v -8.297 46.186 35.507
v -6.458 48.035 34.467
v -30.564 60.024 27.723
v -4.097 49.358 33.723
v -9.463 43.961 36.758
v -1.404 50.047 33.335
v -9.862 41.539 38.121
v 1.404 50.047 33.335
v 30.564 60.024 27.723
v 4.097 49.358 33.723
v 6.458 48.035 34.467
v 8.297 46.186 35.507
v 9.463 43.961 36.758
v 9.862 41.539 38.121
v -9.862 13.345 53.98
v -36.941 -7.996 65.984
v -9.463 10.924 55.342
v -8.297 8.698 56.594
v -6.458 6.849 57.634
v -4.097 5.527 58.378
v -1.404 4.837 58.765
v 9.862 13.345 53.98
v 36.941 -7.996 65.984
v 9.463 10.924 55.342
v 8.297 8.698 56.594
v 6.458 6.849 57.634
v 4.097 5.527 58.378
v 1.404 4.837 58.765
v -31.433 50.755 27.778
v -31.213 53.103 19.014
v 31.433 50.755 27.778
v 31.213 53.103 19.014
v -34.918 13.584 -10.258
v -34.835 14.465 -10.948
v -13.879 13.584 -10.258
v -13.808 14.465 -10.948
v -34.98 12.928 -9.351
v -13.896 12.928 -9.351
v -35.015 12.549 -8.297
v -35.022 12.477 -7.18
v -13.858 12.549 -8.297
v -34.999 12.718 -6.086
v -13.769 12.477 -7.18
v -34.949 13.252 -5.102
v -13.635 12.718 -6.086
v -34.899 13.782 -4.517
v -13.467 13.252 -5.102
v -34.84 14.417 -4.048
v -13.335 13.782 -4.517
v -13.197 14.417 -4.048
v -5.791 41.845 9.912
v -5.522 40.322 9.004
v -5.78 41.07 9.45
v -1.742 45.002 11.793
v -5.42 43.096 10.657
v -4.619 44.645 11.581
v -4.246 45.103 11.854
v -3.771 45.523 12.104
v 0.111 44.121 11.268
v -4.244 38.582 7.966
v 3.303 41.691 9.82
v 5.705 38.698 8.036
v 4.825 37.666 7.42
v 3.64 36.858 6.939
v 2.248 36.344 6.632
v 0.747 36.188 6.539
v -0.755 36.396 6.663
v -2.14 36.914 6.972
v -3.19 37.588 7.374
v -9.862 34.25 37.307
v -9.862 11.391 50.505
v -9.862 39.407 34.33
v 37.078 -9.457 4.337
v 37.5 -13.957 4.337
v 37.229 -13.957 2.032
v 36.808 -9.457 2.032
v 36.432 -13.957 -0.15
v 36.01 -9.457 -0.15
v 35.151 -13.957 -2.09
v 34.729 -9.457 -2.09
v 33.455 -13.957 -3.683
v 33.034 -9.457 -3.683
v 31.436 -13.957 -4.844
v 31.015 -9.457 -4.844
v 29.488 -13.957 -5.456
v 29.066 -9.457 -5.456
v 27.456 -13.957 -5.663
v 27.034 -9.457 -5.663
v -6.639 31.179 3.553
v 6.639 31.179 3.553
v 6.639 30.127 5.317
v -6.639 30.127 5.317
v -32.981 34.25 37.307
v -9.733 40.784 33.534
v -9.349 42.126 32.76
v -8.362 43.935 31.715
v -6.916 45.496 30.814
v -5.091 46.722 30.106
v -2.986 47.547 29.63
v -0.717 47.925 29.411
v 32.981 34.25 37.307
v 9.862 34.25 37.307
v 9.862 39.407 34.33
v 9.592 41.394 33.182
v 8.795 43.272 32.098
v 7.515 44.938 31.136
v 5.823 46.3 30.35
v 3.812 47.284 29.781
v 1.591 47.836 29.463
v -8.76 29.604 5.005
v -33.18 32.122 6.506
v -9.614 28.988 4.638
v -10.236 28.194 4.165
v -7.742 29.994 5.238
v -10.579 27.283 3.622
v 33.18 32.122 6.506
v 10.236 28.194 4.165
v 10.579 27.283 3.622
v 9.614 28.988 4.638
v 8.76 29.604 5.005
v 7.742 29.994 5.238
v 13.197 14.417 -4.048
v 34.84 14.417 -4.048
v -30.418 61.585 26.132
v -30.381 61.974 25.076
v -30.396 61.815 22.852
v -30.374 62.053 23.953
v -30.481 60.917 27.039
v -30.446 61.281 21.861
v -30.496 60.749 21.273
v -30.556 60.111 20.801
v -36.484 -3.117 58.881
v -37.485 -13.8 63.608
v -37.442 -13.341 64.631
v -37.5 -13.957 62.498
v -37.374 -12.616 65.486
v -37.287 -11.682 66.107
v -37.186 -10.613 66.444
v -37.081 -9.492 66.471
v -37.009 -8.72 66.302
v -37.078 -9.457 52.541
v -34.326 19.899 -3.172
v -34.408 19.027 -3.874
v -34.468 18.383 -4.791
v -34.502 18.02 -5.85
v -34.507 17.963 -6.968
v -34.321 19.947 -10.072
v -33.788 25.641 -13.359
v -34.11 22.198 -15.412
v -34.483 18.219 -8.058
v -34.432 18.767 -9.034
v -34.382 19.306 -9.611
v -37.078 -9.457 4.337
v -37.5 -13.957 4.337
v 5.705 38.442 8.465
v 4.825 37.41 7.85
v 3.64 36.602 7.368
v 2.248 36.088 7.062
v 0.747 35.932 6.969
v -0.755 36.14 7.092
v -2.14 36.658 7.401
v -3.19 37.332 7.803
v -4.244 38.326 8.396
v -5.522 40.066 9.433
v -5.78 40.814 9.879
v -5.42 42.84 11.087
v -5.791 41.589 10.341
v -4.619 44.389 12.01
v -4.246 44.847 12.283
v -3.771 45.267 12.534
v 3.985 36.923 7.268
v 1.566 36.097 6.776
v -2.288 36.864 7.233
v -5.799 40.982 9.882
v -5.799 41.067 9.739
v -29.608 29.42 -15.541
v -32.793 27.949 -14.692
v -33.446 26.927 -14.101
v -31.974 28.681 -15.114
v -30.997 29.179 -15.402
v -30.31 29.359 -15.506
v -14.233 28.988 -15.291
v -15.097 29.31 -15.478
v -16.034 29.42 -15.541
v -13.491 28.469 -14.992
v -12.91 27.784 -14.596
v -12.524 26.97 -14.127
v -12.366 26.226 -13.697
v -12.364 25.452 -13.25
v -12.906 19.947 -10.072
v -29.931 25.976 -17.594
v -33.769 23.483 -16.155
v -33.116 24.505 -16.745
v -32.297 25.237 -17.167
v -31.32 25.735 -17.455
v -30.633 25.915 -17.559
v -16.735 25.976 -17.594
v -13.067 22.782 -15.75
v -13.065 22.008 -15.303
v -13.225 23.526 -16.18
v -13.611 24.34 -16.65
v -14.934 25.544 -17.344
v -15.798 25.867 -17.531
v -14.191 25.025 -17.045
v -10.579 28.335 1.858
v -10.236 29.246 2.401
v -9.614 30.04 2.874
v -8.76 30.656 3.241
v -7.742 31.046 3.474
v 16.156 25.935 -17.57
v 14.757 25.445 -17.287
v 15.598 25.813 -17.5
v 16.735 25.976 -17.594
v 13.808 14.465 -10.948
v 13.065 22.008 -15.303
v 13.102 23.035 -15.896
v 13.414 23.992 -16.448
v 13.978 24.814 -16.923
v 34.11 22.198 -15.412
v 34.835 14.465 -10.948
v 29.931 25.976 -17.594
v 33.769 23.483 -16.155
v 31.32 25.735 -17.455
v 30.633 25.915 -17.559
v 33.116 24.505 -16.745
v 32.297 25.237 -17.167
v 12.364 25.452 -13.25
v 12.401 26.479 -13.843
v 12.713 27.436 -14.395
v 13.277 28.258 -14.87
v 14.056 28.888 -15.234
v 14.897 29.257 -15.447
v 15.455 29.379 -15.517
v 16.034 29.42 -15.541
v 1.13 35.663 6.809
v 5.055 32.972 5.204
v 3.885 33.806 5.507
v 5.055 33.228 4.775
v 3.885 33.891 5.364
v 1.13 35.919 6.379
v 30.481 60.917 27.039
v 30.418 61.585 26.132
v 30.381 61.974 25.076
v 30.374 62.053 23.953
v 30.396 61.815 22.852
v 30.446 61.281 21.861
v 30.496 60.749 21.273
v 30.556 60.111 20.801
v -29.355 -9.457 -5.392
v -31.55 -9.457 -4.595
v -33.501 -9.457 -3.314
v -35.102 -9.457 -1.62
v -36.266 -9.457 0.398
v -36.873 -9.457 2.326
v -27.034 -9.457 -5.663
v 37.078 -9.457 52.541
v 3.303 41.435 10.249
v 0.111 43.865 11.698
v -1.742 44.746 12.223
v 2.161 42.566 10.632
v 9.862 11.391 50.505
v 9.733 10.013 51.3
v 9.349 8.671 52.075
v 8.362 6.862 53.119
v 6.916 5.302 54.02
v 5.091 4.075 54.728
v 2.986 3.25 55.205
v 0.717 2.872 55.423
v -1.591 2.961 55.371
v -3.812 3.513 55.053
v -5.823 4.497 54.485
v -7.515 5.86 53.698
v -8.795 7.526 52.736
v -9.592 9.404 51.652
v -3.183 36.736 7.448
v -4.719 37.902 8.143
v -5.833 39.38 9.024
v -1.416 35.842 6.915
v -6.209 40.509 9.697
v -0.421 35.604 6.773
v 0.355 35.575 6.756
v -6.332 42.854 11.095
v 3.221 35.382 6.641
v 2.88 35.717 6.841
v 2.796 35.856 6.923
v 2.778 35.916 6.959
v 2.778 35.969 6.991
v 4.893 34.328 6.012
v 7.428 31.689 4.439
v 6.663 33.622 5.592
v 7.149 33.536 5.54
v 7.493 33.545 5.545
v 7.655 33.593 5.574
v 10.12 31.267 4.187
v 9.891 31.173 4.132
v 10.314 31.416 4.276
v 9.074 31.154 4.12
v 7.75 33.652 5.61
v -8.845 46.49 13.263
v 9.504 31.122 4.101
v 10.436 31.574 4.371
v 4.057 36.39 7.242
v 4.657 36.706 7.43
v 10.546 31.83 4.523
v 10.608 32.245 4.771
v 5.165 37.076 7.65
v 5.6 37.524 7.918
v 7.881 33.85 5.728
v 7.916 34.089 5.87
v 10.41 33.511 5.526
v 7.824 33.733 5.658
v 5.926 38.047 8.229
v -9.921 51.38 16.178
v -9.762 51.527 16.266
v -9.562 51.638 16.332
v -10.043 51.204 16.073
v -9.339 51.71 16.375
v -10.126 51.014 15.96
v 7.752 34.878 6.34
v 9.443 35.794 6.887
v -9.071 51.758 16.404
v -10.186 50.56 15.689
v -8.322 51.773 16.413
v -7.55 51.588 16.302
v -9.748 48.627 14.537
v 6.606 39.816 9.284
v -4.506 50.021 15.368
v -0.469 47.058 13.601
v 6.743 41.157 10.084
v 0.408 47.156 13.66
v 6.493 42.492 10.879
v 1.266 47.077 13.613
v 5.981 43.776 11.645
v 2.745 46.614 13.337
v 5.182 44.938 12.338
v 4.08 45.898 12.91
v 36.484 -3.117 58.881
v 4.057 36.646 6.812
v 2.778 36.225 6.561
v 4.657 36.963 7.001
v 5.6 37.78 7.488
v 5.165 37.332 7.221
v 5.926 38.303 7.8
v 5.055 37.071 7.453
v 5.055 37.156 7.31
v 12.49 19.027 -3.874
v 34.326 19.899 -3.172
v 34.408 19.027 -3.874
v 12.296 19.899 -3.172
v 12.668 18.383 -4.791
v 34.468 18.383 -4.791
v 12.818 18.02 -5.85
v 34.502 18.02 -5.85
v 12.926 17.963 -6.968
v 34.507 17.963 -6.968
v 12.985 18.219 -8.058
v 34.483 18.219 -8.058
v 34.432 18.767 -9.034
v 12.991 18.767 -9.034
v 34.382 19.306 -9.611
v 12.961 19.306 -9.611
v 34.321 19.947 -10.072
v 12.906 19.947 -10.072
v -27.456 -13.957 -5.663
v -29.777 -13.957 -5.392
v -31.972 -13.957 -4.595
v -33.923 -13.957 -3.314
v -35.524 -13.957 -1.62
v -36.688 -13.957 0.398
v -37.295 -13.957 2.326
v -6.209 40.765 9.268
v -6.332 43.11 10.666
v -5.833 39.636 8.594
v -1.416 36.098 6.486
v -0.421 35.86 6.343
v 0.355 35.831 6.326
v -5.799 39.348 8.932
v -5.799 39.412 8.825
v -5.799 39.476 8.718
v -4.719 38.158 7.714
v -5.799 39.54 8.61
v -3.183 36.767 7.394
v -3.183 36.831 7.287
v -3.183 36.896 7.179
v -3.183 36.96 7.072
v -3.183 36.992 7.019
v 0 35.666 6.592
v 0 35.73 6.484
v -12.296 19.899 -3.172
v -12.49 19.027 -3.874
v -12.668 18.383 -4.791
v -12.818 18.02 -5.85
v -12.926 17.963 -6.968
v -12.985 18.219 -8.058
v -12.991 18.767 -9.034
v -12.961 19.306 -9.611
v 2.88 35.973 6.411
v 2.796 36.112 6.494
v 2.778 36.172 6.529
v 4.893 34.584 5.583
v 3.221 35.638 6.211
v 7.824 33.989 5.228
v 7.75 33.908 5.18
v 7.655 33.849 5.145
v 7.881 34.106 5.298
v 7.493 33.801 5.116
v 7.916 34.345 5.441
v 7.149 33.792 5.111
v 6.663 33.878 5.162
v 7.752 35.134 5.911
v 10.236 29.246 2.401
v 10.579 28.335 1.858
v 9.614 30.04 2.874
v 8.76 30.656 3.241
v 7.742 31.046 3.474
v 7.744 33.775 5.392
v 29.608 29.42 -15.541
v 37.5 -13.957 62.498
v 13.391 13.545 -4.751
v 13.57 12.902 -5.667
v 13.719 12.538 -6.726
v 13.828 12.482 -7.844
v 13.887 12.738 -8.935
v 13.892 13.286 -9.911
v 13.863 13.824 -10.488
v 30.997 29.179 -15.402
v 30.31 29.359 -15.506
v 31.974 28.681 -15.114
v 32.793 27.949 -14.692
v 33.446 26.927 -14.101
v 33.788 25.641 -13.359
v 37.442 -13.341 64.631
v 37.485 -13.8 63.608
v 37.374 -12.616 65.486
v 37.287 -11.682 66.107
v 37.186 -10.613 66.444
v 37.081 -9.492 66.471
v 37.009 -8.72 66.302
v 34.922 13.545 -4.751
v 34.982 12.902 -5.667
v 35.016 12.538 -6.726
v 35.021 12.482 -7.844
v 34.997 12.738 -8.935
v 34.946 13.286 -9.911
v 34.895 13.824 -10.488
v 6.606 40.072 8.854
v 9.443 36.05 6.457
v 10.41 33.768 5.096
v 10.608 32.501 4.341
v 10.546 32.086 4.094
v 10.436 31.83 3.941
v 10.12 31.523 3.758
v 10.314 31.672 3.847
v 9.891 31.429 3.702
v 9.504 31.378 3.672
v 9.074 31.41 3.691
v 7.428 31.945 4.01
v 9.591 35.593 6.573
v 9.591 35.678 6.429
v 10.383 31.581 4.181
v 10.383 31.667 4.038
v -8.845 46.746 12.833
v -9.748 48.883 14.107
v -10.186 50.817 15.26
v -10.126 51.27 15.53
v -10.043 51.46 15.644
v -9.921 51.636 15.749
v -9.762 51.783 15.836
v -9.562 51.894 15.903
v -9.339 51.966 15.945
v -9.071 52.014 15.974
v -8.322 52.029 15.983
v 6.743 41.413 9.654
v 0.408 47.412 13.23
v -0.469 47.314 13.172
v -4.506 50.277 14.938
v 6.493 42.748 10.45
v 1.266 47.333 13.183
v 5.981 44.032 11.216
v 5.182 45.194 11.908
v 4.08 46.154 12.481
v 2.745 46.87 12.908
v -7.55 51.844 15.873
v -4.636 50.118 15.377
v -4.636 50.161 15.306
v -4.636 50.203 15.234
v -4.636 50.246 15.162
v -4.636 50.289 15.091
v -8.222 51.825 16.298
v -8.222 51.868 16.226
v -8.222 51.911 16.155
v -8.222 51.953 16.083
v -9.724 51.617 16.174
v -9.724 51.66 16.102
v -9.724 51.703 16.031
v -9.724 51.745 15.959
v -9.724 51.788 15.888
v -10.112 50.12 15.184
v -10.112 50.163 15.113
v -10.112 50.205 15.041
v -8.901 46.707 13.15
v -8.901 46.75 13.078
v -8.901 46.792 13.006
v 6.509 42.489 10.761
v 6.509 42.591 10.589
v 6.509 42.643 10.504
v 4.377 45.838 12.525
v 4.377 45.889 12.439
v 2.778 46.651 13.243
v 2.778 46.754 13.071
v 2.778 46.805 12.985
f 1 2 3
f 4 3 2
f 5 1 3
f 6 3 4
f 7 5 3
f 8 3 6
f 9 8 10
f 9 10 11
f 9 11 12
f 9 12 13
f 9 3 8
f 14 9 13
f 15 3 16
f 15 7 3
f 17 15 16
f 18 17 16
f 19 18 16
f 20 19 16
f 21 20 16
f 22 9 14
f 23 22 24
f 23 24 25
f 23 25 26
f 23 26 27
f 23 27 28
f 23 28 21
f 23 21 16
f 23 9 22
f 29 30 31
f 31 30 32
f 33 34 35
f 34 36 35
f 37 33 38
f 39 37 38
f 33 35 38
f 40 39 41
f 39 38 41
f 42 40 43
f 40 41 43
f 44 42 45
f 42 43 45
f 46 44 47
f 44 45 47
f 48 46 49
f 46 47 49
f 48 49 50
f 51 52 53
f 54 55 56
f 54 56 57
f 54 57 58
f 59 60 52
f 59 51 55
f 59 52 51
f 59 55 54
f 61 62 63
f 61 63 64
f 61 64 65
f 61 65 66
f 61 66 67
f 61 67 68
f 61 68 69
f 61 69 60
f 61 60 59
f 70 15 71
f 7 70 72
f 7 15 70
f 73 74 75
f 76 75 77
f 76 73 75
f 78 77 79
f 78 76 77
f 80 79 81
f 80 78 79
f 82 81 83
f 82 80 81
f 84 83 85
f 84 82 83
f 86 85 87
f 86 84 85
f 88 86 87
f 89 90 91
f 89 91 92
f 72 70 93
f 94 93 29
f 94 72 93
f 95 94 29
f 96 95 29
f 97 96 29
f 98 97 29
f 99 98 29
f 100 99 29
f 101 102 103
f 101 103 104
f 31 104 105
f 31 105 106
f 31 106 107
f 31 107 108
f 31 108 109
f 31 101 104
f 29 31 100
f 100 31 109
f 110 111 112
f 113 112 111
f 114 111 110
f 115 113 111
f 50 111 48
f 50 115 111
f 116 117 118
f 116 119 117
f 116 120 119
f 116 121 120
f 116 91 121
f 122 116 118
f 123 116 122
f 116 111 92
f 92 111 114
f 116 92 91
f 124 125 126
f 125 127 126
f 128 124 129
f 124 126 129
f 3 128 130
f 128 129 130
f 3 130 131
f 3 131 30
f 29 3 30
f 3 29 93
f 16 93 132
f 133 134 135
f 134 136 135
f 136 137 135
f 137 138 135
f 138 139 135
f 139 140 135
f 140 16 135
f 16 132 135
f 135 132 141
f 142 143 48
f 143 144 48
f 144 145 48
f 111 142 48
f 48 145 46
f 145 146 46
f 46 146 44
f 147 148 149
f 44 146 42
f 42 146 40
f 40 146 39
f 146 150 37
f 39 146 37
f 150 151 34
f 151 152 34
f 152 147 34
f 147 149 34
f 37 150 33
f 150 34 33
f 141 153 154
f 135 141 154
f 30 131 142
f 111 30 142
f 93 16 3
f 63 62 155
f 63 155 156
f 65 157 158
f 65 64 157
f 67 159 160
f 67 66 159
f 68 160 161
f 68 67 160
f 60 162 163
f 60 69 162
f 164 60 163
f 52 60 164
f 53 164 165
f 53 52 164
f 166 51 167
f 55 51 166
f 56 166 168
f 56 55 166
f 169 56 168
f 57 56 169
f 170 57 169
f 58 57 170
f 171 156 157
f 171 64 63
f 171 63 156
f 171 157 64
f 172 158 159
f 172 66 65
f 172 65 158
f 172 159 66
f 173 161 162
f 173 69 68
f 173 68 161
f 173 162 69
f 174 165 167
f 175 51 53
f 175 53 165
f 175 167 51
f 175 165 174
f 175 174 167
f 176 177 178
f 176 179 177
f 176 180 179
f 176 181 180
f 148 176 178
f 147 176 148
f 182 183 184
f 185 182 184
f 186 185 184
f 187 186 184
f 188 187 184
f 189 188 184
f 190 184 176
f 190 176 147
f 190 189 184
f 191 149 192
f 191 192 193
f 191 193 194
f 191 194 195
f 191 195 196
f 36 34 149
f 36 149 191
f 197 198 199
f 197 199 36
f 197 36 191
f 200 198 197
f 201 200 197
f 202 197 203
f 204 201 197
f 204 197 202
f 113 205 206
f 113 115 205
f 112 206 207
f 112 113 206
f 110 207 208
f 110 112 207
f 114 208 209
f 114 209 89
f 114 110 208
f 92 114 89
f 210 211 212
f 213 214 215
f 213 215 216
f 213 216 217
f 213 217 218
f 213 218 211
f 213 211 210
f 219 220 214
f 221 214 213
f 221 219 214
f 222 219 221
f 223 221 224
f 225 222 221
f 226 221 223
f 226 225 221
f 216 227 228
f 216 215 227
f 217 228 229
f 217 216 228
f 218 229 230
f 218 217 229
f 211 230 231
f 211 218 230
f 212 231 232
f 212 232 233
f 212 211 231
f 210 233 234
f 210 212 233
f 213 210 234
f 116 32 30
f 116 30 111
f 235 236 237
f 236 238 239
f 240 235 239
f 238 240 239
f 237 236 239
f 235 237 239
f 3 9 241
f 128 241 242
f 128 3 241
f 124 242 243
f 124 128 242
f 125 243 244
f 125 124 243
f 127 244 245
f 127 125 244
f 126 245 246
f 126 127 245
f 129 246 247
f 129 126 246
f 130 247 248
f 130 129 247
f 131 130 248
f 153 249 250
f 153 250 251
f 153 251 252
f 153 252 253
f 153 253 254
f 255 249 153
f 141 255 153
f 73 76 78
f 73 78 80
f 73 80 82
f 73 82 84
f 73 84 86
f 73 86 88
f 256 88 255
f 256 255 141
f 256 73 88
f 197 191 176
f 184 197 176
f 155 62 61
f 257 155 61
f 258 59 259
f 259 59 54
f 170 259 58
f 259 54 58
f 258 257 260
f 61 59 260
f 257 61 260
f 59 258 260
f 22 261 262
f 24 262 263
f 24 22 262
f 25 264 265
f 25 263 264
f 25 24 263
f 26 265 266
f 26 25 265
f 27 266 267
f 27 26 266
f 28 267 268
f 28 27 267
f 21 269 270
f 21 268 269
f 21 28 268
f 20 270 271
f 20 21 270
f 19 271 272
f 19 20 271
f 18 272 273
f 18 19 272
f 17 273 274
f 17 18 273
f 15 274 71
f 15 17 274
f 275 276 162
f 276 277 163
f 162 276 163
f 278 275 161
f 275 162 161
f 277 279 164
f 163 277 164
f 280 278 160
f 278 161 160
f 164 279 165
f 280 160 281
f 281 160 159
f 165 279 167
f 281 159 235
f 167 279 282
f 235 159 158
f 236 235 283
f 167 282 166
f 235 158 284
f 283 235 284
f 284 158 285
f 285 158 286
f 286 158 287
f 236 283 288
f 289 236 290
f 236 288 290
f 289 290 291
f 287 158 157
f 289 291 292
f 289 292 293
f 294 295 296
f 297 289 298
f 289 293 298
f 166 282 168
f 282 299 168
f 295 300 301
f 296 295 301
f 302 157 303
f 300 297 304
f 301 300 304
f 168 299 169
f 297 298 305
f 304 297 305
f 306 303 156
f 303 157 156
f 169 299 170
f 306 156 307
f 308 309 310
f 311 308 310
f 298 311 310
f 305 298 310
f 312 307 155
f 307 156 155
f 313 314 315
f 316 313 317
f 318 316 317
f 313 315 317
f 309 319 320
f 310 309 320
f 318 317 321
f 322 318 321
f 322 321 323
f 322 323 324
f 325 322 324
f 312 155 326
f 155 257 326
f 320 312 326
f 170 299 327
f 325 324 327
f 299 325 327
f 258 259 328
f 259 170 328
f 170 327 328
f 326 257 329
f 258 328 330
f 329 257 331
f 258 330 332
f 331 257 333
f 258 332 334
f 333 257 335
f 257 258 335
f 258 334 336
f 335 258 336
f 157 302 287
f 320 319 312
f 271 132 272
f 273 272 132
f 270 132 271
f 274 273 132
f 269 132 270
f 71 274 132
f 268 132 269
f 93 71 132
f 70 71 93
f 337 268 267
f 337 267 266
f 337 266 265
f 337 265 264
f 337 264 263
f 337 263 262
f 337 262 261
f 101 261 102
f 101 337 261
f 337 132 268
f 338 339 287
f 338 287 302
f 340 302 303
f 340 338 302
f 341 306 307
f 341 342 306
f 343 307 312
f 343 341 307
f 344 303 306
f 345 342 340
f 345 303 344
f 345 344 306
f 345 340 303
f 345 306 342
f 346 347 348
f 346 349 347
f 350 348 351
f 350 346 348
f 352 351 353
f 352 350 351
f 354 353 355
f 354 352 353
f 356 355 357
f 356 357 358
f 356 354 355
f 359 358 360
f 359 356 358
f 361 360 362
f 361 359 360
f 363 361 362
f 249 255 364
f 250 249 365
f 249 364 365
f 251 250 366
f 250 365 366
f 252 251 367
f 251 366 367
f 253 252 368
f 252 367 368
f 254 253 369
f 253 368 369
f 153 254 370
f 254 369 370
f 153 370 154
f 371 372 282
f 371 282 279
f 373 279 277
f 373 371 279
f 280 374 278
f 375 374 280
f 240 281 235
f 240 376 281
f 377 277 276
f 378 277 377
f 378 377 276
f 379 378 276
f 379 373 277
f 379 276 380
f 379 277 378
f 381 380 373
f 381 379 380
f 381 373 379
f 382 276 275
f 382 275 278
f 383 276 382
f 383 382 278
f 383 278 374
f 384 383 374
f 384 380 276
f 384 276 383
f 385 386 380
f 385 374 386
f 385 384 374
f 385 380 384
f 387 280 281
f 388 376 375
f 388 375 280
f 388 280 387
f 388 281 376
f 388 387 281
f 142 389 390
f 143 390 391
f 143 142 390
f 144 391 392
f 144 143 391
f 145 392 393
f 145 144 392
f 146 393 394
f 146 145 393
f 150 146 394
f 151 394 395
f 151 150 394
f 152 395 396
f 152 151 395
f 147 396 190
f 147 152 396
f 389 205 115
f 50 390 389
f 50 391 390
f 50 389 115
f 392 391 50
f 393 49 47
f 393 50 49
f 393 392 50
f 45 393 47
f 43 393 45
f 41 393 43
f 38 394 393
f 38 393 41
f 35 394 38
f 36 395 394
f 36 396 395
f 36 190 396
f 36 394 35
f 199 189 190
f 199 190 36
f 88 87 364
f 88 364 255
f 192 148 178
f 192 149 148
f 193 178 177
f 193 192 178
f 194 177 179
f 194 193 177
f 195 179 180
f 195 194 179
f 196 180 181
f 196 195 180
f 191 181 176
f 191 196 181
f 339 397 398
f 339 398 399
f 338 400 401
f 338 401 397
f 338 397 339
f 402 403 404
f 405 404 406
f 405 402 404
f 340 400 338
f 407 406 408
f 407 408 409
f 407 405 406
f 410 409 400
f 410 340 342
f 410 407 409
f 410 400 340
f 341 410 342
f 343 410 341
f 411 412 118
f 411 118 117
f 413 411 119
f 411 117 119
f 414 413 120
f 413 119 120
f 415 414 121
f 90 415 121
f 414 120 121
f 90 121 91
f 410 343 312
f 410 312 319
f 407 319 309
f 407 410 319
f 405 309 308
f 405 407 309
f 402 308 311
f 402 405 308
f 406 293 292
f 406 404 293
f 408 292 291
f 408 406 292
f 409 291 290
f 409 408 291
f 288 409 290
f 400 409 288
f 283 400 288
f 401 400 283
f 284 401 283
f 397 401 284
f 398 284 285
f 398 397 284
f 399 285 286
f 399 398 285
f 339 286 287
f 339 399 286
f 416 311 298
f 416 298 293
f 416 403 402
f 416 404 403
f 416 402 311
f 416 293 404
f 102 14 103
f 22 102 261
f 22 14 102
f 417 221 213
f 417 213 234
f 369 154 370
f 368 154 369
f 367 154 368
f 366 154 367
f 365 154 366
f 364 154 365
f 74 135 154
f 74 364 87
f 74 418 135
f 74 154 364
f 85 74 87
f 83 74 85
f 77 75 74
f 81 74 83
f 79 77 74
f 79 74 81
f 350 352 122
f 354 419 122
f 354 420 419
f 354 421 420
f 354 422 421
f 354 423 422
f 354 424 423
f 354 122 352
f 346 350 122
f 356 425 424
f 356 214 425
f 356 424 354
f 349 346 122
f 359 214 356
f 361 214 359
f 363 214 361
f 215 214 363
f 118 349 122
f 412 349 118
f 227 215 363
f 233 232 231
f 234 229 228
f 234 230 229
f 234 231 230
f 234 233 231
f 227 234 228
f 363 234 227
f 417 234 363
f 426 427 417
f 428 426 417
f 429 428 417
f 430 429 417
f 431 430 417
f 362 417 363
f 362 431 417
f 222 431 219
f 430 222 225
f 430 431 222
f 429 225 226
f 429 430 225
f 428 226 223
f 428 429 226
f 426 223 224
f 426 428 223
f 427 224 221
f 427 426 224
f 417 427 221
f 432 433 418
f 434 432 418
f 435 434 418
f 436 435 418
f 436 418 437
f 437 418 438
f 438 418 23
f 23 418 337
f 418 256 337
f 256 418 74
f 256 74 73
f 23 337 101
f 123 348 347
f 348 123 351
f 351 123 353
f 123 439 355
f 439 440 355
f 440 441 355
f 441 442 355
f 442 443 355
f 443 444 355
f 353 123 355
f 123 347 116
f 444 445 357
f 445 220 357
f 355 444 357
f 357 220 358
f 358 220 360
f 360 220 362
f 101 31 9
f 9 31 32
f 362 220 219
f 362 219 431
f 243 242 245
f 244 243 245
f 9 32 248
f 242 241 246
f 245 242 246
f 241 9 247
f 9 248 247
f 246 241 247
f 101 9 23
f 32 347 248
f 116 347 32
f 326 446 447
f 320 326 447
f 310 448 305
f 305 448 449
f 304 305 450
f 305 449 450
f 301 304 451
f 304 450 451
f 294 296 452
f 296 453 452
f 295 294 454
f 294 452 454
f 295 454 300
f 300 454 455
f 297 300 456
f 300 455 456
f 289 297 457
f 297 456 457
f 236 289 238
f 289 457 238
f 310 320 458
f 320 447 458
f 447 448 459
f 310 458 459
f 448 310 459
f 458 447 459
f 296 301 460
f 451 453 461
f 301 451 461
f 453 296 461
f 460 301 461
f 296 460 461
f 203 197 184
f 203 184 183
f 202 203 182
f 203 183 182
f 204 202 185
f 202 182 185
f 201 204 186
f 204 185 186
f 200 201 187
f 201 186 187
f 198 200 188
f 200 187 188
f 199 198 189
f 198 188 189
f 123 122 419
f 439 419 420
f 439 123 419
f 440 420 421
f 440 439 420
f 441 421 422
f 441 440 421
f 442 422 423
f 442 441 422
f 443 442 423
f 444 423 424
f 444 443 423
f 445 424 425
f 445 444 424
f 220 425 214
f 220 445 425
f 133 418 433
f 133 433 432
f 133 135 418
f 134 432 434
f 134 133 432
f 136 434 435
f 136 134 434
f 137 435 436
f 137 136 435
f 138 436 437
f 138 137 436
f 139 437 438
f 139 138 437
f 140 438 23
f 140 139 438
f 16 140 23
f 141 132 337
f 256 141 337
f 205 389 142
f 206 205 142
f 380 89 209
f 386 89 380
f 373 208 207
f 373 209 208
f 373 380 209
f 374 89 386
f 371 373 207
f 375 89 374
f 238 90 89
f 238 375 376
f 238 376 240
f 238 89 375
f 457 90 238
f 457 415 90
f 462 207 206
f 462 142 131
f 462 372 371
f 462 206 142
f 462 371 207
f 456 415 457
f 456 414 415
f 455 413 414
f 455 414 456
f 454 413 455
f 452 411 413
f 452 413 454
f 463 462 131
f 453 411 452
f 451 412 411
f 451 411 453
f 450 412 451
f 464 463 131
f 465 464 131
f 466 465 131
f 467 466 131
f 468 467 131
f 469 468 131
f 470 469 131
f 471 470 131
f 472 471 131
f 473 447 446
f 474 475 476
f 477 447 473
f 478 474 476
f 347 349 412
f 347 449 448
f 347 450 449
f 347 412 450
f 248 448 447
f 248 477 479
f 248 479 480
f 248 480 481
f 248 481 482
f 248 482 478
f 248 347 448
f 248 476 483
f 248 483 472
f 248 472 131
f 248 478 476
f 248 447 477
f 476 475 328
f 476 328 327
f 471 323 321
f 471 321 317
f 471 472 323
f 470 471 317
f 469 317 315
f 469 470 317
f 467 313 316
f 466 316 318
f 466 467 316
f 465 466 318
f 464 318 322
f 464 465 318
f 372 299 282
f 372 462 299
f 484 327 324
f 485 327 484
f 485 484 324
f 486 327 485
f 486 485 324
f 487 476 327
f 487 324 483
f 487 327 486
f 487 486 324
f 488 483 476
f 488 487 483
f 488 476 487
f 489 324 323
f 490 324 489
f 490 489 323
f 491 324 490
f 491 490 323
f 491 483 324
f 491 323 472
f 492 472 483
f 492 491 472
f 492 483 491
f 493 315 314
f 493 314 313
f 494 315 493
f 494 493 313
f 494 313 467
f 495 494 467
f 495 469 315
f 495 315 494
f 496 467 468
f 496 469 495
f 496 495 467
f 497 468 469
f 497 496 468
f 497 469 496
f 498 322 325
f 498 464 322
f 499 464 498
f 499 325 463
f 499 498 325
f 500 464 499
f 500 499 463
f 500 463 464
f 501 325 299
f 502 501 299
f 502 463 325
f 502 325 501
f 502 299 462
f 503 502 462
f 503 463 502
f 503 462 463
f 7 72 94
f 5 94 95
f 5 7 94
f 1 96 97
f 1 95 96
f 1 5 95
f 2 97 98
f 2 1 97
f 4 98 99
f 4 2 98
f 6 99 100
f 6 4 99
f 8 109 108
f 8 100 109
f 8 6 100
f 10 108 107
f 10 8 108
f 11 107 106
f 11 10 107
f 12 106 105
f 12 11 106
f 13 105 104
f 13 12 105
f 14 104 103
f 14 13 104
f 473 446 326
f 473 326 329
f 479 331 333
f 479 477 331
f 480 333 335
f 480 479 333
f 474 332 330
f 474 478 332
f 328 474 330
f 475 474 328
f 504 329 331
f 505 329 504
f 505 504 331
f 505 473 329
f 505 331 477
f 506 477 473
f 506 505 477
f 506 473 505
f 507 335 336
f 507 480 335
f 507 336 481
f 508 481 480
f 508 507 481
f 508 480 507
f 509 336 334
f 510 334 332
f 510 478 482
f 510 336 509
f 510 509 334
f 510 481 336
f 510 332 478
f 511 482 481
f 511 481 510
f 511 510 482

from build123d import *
from OCP.BRepFilletAPI import BRepFilletAPI_MakeChamfer

# Parameters (mm, degrees)
EXTRUDE_2_DEPTH                 = 37.5
CUT_EXTRUDE_7_DEPTH             = 103.837497834
CUT_EXTRUDE_7_DEPTH_BACK        = 103.837497834
CUT_EXTRUDE_3_DEPTH             = 103.837497834
CUT_EXTRUDE_3_DEPTH_BACK        = 103.837497834
CUT_EXTRUDE_4_REACH             = 108.804
CUT_EXTRUDE_4_DIRECTION_2_DEPTH = 107.803974103
FILLET_1_R                      = 10
FILLET_2_R                      = 10
CHAMFER_1_SIZE                  = 10
CHAMFER_1_SIZE2                 = 7.348769571
CHAMFER_1_SIZE2_2               = 7.320508076
FILLET_4_R                      = 4
FILLET_5_R                      = 4
FILLET_6_R                      = 4
FILLET_7_R                      = 4
FILLET_8_R                      = 4
CUT_EXTRUDE_5_REACH             = 86.613
FILLET_9_R                      = 4
CUT_EXTRUDE_19_DEPTH            = 0.5


with BuildPart() as part:
    # 草图1 → 凸台-拉伸2 (new, symmetric)
    with BuildSketch(Plane(origin=(0, 0, 0), x_dir=(0, 0, -1), z_dir=(1, 0, 0))):
        Polygon((-69.337215993, -13.957199945), (5.662784007, -13.957199945), (5.662784007, -9.457199945), (-62.541106353, -9.457199945), (-37.306862797, 34.249791985), (-22.77752063, 59.415350818), (-6.506208301, 32.121536588), (7.539405244, 8.561152577), (17.593990312, 25.976204763), (15.540885381, 29.420122711), (6.662784007, 14.042800055), (-24.337215993, 66.042800055), align=None)
    extrude(amount=EXTRUDE_2_DEPTH, both=True)

    # 草图3 → 切除-拉伸-薄壁7 (cut, two sides: drawn at the far end of the back side and taken through both)
    with BuildSketch(Plane.XY.offset(-CUT_EXTRUDE_7_DEPTH_BACK)):
        Polygon((-30, 66.042800055), (-37.5, -13.957199945), (-47.456342261, -13.023792858), (-39.956342261, 66.976207142), align=None)
    extrude(amount=CUT_EXTRUDE_7_DEPTH + CUT_EXTRUDE_7_DEPTH_BACK, mode=Mode.SUBTRACT)

    # 草图5 → 切除-拉伸3 (cut, two sides: drawn at the far end of the back side and taken through both)
    with BuildSketch(Plane.XY.offset(-CUT_EXTRUDE_3_DEPTH_BACK)):
        Polygon((37.5, 66.042800055), (37.5, -13.957199945), (30, 66.042800055), align=None)
    extrude(amount=CUT_EXTRUDE_3_DEPTH + CUT_EXTRUDE_3_DEPTH_BACK, mode=Mode.SUBTRACT)

    # 草图7 → 切除-拉伸4 (cut, up to next)
    with BuildSketch(Plane(origin=(0, 6.612698137, -11.092267843), x_dir=(-1, 0, 0), z_dir=(0, 0.5120645423166438, -0.8589469742085631)), mode=Mode.PRIVATE) as cut_extrude_4_sk1:
        Polygon((-10, 28.600496992), (10, 28.600496992), (15, 0), (-15, 0), align=None)
    cut_extrude_4_tool1 = extrude(cut_extrude_4_sk1.sketch, amount=-CUT_EXTRUDE_4_REACH, mode=Mode.PRIVATE) & part.part
    add(cut_extrude_4_tool1.solids().sort_by_distance((0, 18.076976, -4.257794))[0], mode=Mode.SUBTRACT)

    # 草图7 → 切除-拉伸4 direction 2 (cut)
    with BuildSketch(Plane(origin=(0, 6.612698137, -11.092267843), x_dir=(-1, 0, 0), z_dir=(0, 0.5120645423166438, -0.8589469742085631))):
        Polygon((-10, 28.600496992), (10, 28.600496992), (15, 0), (-15, 0), align=None)
    extrude(amount=CUT_EXTRUDE_4_DIRECTION_2_DEPTH, mode=Mode.SUBTRACT)

    # 圆角1
    fillet_1_edges = [part.edges().sort_by_distance(p)[0] for p in [
        (37.2890625, -11.707199945, -5.662784007),
    ]]
    fillet(fillet_1_edges, radius=FILLET_1_R)

    # 圆角2
    fillet_2_edges = [part.edges().sort_by_distance(p)[0] for p in [
        (-37.2890625, -11.707199945, -5.662784007),
    ]]
    fillet(fillet_2_edges, radius=FILLET_2_R)

    # 倒角1: one chamfer whose edges measure the first distance from different faces: ONE call of the kernel's chamfer builder (chamfer() names one face for all edges)
    chamfer_1_edges_1 = [part.edges().sort_by_distance(p)[0] for p in [
        (0, 59.415350818, 22.77752063),
    ]]
    chamfer_1_side_1 = [part.faces().sort_by_distance(p)[0] for p in [
        (0, 23.884294487, 43.291385568),
    ]]
    chamfer_1_edges_2 = [part.edges().sort_by_distance(p)[0] for p in [
        (0, -9.457199945, 62.541106353),
    ]]
    chamfer_1_side_2 = [part.faces().sort_by_distance(p)[0] for p in [
        (0, -9.457199945, 28.713118307),
    ]]
    chamfer_1 = BRepFilletAPI_MakeChamfer(part.part.solid().wrapped)
    for e in chamfer_1_edges_1:
        chamfer_1.Add(CHAMFER_1_SIZE, CHAMFER_1_SIZE2, e.wrapped, chamfer_1_side_1[0].wrapped)  # the first distance lies on this face
    for e in chamfer_1_edges_2:
        chamfer_1.Add(CHAMFER_1_SIZE, CHAMFER_1_SIZE2_2, e.wrapped, chamfer_1_side_2[0].wrapped)  # the first distance lies on this face
    add(Compound.cast(chamfer_1.Shape()), mode=Mode.REPLACE)

    # 圆角4
    fillet_4_edges = [part.edges().sort_by_distance(p)[0] for p in [
        (0, -13.957199945, 69.337215993),
    ]]
    fillet(fillet_4_edges, radius=FILLET_4_R)

    # 圆角5
    fillet_5_edges = [part.edges().sort_by_distance(p)[0] for p in [
        (0, 66.042800055, 24.337215993),
    ]]
    fillet(fillet_5_edges, radius=FILLET_5_R)

    # 圆角6
    fillet_6_edges = [part.edges().sort_by_distance(p)[0] for p in [
        (24.181372827, 14.042800055, -6.662784007),
        (-24.181372827, 14.042800055, -6.662784007),
    ]]
    fillet(fillet_6_edges, radius=FILLET_6_R)

    # 圆角7
    fillet_7_edges = [part.edges().sort_by_distance(p)[0] for p in [
        (24.88913288, 8.561152577, -7.539405244),
        (-24.88913288, 8.561152577, -7.539405244),
    ]]
    fillet(fillet_7_edges, radius=FILLET_7_R)

    # 圆角8
    fillet_8_edges = [part.edges().sort_by_distance(p)[0] for p in [
        (12.323882788, 27.698163737, -16.567437846),
        (-12.323882788, 27.698163737, -16.567437846),
        (-33.594809655, 27.698163737, -16.567437846),
        (33.594809655, 27.698163737, -16.567437846),
    ]]
    fillet(fillet_8_edges, radius=FILLET_8_R)

    # 切除-拉伸5: up to this plane
    cut_extrude_5_end = Plane(origin=(37.5, 34.249791985, 37.306862797), z_dir=(0, 0.5000000000000044, 0.8660254037844362))
    # 草图8 → 切除-拉伸5 (cut, up to the surface)
    with BuildSketch(Plane(origin=(0, 26.273073909, 46.70768695), x_dir=(1, 0, 0), z_dir=(0, 0.4902612396325587, 0.8715755371245495)), mode=Mode.PRIVATE) as cut_extrude_5_sk1:
        with BuildLine():
            Line((9.862156139, 17.515327615), (9.862156139, -14.832544522))
            ThreePointArc((9.862156139, -14.832544522), (0, -24.694700661), (-9.862156139, -14.832544522))
            Line((-9.862156139, -14.832544522), (-9.862156139, 17.515327615))
            ThreePointArc((-9.862156139, 17.515327615), (0, 27.377483754), (9.862156139, 17.515327615))
        make_face()
    cut_extrude_5_tool1 = split(extrude(cut_extrude_5_sk1.sketch, amount=-CUT_EXTRUDE_5_REACH, mode=Mode.PRIVATE), bisect_by=cut_extrude_5_end, keep=Keep.BOTH, mode=Mode.PRIVATE)
    add(cut_extrude_5_tool1.solids().sort_by_distance((0, 27.442198, 46.050055))[0], mode=Mode.SUBTRACT)

    # 圆角9
    fillet_9_edges = [part.edges().sort_by_distance(p)[0] for p in [
        (10, 30.653121751, 4.435165153),
        (-10, 30.653121751, 4.435165153),
    ]]
    fillet(fillet_9_edges, radius=FILLET_9_R)

    # 草图9 → 切除-拉伸19 (cut)
    # profile 1 of 2: a face of its own
    with BuildSketch(Plane(origin=(0, 6.612698137, -11.092267843), x_dir=(-1, 0, 0), z_dir=(0, 0.5120645423166438, -0.8589469742085631))):
        with BuildLine():
            add(Edge.make_bspline(
                [(-6.606037662, 38.953429024), (-5.711334874, 40.311243339), (-3.854311729, 43.564154073), (-0.858400361, 45.826493842), (0.468870754, 47.38516919)],
                knots=[0, 0, 0, 0, 0.444342779, 1, 1, 1, 1], degree=3))
            add(Edge.make_bspline(
                [(-6.606037662, 38.953429024), (-9.378559135, 35.780697287), (-14.751433674, 24.057721204), (-5.055372805, 30.986280975)],
                knots=[0, 0, 0, 0, 0.897758924, 0.897758924, 0.897758924, 0.897758924], degree=3))
            add(Edge.make_bspline(
                [(-5.055372805, 30.986280975), (-3.951139058, 31.775338472), (-2.651465095, 32.806301591), (-1.130252381, 34.119348895)],
                knots=[0.897758924, 0.897758924, 0.897758924, 0.897758924, 1, 1, 1, 1], degree=3))
            add(Edge.make_bspline(
                [(6.332322248, 42.490883232), (6.421345736, 41.744828612), (6.344182877, 40.360506044), (6.000591752, 38.579631764), (5.252680808, 37.443200943), (4.475701743, 36.345853392), (3.207138679, 35.357882181), (1.705465876, 34.34846817), (0.163062797, 33.924083238), (-0.754774414, 34.050408523), (-1.130252381, 34.119348895)],
                knots=[0, 0, 0, 0, 0.117072849, 0.219314974, 0.278544439, 0.329333286, 0.430146269, 0.52813716, 0.613566108, 0.673160343, 0.673160343, 0.673160343, 0.673160343], degree=3))
            add(Edge.make_bspline(
                [(0.468870754, 47.38516919), (1.233033198, 47.922620622), (2.49626224, 49.235976382), (4.241552698, 50.722199927), (5.757086701, 51.611825239), (6.890776807, 52.349356015), (7.979867228, 52.911105038), (9.009325049, 52.897932667), (9.772550935, 52.701828247), (10.268614434, 51.887019071), (10.101877149, 50.633458002), (9.70577606, 48.904902538), (8.623104825, 46.001853987), (7.426413078, 43.809596625), (6.332322248, 42.490883232)],
                knots=[0, 0, 0, 0, 0.125072756, 0.245842542, 0.307491057, 0.361289695, 0.429653226, 0.46668336, 0.499065273, 0.530480343, 0.584936423, 0.663141117, 0.772009703, 1, 1, 1, 1], degree=3))
        make_face()
        with BuildLine():
            add(Edge.make_bspline(
                [(-5.925793934, 36.893896271), (-6.314452071, 36.418621882), (-10.90174323, 28.38229129), (-2.668424669, 33.749192184), (-2.77783358, 34.475014711)],
                knots=[0, 0, 0, 0, 0.486390134, 1, 1, 1, 1], degree=3))
            add(Edge.make_bspline(
                [(-2.77783358, 34.475014711), (-2.957051517, 34.52370524), (-3.778444373, 34.774634797), (-5.022215854, 35.454494355), (-5.730155434, 36.410802759), (-5.925793934, 36.893896271)],
                knots=[0.761269827, 0.761269827, 0.761269827, 0.761269827, 0.790511254, 0.896348436, 0.975855606, 0.975855606, 0.975855606, 0.975855606], degree=3))
        make_face(mode=Mode.SUBTRACT)
        with BuildLine():
            add(Edge.make_bspline(
                [(-5.704606663, 37.354305889), (-4.82005562, 39.114963546), (-2.167848058, 42.452443751), (1.487716627, 44.915381127), (3.771169156, 45.300026951)],
                knots=[0.035918318, 0.035918318, 0.035918318, 0.035918318, 0.452487374, 0.939525842, 0.939525842, 0.939525842, 0.939525842], degree=3))
            add(Edge.make_bspline(
                [(-5.704606663, 37.354305889), (-4.903172884, 35.848608285), (-2.06778183, 33.826601764), (2.360384852, 34.966954875), (4.576007986, 37.506203367), (6.220363831, 40.221899193), (5.250367062, 43.052302972), (4.513305616, 44.655132724), (3.771169156, 45.300026951)],
                knots=[0, 0, 0, 0, 0.248218278, 0.43884002, 0.59987409, 0.733439298, 0.868620911, 1, 1, 1, 1], degree=3))
        make_face(mode=Mode.SUBTRACT)
    # profile 2 of 2: a face of its own
    with BuildSketch(Plane(origin=(0, 6.612698137, -11.092267843), x_dir=(-1, 0, 0), z_dir=(0, 0.5120645423166438, -0.8589469742085631))):
        with BuildLine():
            add(Edge.make_bspline(
                [(-6.606037662, 38.953429024), (-6.857731684, 39.967243119), (-6.66251098, 41.958089443), (-5.736175757, 44.327135585), (-4.335162577, 45.931678579), (-2.409061861, 47.170333165), (-0.663837917, 47.683486872), (0.468870754, 47.38516919)],
                knots=[0, 0, 0, 0, 0.241647458, 0.464965071, 0.586300838, 0.737202049, 1, 1, 1, 1], degree=3))
            add(Edge.make_bspline(
                [(-6.606037662, 38.953429024), (-5.711334874, 40.311243339), (-3.854311729, 43.564154073), (-0.858400361, 45.826493842), (0.468870754, 47.38516919)],
                knots=[0, 0, 0, 0, 0.444342779, 1, 1, 1, 1], degree=3))
        make_face()
    extrude(amount=-CUT_EXTRUDE_19_DEPTH, mode=Mode.SUBTRACT)


solid = part.part
